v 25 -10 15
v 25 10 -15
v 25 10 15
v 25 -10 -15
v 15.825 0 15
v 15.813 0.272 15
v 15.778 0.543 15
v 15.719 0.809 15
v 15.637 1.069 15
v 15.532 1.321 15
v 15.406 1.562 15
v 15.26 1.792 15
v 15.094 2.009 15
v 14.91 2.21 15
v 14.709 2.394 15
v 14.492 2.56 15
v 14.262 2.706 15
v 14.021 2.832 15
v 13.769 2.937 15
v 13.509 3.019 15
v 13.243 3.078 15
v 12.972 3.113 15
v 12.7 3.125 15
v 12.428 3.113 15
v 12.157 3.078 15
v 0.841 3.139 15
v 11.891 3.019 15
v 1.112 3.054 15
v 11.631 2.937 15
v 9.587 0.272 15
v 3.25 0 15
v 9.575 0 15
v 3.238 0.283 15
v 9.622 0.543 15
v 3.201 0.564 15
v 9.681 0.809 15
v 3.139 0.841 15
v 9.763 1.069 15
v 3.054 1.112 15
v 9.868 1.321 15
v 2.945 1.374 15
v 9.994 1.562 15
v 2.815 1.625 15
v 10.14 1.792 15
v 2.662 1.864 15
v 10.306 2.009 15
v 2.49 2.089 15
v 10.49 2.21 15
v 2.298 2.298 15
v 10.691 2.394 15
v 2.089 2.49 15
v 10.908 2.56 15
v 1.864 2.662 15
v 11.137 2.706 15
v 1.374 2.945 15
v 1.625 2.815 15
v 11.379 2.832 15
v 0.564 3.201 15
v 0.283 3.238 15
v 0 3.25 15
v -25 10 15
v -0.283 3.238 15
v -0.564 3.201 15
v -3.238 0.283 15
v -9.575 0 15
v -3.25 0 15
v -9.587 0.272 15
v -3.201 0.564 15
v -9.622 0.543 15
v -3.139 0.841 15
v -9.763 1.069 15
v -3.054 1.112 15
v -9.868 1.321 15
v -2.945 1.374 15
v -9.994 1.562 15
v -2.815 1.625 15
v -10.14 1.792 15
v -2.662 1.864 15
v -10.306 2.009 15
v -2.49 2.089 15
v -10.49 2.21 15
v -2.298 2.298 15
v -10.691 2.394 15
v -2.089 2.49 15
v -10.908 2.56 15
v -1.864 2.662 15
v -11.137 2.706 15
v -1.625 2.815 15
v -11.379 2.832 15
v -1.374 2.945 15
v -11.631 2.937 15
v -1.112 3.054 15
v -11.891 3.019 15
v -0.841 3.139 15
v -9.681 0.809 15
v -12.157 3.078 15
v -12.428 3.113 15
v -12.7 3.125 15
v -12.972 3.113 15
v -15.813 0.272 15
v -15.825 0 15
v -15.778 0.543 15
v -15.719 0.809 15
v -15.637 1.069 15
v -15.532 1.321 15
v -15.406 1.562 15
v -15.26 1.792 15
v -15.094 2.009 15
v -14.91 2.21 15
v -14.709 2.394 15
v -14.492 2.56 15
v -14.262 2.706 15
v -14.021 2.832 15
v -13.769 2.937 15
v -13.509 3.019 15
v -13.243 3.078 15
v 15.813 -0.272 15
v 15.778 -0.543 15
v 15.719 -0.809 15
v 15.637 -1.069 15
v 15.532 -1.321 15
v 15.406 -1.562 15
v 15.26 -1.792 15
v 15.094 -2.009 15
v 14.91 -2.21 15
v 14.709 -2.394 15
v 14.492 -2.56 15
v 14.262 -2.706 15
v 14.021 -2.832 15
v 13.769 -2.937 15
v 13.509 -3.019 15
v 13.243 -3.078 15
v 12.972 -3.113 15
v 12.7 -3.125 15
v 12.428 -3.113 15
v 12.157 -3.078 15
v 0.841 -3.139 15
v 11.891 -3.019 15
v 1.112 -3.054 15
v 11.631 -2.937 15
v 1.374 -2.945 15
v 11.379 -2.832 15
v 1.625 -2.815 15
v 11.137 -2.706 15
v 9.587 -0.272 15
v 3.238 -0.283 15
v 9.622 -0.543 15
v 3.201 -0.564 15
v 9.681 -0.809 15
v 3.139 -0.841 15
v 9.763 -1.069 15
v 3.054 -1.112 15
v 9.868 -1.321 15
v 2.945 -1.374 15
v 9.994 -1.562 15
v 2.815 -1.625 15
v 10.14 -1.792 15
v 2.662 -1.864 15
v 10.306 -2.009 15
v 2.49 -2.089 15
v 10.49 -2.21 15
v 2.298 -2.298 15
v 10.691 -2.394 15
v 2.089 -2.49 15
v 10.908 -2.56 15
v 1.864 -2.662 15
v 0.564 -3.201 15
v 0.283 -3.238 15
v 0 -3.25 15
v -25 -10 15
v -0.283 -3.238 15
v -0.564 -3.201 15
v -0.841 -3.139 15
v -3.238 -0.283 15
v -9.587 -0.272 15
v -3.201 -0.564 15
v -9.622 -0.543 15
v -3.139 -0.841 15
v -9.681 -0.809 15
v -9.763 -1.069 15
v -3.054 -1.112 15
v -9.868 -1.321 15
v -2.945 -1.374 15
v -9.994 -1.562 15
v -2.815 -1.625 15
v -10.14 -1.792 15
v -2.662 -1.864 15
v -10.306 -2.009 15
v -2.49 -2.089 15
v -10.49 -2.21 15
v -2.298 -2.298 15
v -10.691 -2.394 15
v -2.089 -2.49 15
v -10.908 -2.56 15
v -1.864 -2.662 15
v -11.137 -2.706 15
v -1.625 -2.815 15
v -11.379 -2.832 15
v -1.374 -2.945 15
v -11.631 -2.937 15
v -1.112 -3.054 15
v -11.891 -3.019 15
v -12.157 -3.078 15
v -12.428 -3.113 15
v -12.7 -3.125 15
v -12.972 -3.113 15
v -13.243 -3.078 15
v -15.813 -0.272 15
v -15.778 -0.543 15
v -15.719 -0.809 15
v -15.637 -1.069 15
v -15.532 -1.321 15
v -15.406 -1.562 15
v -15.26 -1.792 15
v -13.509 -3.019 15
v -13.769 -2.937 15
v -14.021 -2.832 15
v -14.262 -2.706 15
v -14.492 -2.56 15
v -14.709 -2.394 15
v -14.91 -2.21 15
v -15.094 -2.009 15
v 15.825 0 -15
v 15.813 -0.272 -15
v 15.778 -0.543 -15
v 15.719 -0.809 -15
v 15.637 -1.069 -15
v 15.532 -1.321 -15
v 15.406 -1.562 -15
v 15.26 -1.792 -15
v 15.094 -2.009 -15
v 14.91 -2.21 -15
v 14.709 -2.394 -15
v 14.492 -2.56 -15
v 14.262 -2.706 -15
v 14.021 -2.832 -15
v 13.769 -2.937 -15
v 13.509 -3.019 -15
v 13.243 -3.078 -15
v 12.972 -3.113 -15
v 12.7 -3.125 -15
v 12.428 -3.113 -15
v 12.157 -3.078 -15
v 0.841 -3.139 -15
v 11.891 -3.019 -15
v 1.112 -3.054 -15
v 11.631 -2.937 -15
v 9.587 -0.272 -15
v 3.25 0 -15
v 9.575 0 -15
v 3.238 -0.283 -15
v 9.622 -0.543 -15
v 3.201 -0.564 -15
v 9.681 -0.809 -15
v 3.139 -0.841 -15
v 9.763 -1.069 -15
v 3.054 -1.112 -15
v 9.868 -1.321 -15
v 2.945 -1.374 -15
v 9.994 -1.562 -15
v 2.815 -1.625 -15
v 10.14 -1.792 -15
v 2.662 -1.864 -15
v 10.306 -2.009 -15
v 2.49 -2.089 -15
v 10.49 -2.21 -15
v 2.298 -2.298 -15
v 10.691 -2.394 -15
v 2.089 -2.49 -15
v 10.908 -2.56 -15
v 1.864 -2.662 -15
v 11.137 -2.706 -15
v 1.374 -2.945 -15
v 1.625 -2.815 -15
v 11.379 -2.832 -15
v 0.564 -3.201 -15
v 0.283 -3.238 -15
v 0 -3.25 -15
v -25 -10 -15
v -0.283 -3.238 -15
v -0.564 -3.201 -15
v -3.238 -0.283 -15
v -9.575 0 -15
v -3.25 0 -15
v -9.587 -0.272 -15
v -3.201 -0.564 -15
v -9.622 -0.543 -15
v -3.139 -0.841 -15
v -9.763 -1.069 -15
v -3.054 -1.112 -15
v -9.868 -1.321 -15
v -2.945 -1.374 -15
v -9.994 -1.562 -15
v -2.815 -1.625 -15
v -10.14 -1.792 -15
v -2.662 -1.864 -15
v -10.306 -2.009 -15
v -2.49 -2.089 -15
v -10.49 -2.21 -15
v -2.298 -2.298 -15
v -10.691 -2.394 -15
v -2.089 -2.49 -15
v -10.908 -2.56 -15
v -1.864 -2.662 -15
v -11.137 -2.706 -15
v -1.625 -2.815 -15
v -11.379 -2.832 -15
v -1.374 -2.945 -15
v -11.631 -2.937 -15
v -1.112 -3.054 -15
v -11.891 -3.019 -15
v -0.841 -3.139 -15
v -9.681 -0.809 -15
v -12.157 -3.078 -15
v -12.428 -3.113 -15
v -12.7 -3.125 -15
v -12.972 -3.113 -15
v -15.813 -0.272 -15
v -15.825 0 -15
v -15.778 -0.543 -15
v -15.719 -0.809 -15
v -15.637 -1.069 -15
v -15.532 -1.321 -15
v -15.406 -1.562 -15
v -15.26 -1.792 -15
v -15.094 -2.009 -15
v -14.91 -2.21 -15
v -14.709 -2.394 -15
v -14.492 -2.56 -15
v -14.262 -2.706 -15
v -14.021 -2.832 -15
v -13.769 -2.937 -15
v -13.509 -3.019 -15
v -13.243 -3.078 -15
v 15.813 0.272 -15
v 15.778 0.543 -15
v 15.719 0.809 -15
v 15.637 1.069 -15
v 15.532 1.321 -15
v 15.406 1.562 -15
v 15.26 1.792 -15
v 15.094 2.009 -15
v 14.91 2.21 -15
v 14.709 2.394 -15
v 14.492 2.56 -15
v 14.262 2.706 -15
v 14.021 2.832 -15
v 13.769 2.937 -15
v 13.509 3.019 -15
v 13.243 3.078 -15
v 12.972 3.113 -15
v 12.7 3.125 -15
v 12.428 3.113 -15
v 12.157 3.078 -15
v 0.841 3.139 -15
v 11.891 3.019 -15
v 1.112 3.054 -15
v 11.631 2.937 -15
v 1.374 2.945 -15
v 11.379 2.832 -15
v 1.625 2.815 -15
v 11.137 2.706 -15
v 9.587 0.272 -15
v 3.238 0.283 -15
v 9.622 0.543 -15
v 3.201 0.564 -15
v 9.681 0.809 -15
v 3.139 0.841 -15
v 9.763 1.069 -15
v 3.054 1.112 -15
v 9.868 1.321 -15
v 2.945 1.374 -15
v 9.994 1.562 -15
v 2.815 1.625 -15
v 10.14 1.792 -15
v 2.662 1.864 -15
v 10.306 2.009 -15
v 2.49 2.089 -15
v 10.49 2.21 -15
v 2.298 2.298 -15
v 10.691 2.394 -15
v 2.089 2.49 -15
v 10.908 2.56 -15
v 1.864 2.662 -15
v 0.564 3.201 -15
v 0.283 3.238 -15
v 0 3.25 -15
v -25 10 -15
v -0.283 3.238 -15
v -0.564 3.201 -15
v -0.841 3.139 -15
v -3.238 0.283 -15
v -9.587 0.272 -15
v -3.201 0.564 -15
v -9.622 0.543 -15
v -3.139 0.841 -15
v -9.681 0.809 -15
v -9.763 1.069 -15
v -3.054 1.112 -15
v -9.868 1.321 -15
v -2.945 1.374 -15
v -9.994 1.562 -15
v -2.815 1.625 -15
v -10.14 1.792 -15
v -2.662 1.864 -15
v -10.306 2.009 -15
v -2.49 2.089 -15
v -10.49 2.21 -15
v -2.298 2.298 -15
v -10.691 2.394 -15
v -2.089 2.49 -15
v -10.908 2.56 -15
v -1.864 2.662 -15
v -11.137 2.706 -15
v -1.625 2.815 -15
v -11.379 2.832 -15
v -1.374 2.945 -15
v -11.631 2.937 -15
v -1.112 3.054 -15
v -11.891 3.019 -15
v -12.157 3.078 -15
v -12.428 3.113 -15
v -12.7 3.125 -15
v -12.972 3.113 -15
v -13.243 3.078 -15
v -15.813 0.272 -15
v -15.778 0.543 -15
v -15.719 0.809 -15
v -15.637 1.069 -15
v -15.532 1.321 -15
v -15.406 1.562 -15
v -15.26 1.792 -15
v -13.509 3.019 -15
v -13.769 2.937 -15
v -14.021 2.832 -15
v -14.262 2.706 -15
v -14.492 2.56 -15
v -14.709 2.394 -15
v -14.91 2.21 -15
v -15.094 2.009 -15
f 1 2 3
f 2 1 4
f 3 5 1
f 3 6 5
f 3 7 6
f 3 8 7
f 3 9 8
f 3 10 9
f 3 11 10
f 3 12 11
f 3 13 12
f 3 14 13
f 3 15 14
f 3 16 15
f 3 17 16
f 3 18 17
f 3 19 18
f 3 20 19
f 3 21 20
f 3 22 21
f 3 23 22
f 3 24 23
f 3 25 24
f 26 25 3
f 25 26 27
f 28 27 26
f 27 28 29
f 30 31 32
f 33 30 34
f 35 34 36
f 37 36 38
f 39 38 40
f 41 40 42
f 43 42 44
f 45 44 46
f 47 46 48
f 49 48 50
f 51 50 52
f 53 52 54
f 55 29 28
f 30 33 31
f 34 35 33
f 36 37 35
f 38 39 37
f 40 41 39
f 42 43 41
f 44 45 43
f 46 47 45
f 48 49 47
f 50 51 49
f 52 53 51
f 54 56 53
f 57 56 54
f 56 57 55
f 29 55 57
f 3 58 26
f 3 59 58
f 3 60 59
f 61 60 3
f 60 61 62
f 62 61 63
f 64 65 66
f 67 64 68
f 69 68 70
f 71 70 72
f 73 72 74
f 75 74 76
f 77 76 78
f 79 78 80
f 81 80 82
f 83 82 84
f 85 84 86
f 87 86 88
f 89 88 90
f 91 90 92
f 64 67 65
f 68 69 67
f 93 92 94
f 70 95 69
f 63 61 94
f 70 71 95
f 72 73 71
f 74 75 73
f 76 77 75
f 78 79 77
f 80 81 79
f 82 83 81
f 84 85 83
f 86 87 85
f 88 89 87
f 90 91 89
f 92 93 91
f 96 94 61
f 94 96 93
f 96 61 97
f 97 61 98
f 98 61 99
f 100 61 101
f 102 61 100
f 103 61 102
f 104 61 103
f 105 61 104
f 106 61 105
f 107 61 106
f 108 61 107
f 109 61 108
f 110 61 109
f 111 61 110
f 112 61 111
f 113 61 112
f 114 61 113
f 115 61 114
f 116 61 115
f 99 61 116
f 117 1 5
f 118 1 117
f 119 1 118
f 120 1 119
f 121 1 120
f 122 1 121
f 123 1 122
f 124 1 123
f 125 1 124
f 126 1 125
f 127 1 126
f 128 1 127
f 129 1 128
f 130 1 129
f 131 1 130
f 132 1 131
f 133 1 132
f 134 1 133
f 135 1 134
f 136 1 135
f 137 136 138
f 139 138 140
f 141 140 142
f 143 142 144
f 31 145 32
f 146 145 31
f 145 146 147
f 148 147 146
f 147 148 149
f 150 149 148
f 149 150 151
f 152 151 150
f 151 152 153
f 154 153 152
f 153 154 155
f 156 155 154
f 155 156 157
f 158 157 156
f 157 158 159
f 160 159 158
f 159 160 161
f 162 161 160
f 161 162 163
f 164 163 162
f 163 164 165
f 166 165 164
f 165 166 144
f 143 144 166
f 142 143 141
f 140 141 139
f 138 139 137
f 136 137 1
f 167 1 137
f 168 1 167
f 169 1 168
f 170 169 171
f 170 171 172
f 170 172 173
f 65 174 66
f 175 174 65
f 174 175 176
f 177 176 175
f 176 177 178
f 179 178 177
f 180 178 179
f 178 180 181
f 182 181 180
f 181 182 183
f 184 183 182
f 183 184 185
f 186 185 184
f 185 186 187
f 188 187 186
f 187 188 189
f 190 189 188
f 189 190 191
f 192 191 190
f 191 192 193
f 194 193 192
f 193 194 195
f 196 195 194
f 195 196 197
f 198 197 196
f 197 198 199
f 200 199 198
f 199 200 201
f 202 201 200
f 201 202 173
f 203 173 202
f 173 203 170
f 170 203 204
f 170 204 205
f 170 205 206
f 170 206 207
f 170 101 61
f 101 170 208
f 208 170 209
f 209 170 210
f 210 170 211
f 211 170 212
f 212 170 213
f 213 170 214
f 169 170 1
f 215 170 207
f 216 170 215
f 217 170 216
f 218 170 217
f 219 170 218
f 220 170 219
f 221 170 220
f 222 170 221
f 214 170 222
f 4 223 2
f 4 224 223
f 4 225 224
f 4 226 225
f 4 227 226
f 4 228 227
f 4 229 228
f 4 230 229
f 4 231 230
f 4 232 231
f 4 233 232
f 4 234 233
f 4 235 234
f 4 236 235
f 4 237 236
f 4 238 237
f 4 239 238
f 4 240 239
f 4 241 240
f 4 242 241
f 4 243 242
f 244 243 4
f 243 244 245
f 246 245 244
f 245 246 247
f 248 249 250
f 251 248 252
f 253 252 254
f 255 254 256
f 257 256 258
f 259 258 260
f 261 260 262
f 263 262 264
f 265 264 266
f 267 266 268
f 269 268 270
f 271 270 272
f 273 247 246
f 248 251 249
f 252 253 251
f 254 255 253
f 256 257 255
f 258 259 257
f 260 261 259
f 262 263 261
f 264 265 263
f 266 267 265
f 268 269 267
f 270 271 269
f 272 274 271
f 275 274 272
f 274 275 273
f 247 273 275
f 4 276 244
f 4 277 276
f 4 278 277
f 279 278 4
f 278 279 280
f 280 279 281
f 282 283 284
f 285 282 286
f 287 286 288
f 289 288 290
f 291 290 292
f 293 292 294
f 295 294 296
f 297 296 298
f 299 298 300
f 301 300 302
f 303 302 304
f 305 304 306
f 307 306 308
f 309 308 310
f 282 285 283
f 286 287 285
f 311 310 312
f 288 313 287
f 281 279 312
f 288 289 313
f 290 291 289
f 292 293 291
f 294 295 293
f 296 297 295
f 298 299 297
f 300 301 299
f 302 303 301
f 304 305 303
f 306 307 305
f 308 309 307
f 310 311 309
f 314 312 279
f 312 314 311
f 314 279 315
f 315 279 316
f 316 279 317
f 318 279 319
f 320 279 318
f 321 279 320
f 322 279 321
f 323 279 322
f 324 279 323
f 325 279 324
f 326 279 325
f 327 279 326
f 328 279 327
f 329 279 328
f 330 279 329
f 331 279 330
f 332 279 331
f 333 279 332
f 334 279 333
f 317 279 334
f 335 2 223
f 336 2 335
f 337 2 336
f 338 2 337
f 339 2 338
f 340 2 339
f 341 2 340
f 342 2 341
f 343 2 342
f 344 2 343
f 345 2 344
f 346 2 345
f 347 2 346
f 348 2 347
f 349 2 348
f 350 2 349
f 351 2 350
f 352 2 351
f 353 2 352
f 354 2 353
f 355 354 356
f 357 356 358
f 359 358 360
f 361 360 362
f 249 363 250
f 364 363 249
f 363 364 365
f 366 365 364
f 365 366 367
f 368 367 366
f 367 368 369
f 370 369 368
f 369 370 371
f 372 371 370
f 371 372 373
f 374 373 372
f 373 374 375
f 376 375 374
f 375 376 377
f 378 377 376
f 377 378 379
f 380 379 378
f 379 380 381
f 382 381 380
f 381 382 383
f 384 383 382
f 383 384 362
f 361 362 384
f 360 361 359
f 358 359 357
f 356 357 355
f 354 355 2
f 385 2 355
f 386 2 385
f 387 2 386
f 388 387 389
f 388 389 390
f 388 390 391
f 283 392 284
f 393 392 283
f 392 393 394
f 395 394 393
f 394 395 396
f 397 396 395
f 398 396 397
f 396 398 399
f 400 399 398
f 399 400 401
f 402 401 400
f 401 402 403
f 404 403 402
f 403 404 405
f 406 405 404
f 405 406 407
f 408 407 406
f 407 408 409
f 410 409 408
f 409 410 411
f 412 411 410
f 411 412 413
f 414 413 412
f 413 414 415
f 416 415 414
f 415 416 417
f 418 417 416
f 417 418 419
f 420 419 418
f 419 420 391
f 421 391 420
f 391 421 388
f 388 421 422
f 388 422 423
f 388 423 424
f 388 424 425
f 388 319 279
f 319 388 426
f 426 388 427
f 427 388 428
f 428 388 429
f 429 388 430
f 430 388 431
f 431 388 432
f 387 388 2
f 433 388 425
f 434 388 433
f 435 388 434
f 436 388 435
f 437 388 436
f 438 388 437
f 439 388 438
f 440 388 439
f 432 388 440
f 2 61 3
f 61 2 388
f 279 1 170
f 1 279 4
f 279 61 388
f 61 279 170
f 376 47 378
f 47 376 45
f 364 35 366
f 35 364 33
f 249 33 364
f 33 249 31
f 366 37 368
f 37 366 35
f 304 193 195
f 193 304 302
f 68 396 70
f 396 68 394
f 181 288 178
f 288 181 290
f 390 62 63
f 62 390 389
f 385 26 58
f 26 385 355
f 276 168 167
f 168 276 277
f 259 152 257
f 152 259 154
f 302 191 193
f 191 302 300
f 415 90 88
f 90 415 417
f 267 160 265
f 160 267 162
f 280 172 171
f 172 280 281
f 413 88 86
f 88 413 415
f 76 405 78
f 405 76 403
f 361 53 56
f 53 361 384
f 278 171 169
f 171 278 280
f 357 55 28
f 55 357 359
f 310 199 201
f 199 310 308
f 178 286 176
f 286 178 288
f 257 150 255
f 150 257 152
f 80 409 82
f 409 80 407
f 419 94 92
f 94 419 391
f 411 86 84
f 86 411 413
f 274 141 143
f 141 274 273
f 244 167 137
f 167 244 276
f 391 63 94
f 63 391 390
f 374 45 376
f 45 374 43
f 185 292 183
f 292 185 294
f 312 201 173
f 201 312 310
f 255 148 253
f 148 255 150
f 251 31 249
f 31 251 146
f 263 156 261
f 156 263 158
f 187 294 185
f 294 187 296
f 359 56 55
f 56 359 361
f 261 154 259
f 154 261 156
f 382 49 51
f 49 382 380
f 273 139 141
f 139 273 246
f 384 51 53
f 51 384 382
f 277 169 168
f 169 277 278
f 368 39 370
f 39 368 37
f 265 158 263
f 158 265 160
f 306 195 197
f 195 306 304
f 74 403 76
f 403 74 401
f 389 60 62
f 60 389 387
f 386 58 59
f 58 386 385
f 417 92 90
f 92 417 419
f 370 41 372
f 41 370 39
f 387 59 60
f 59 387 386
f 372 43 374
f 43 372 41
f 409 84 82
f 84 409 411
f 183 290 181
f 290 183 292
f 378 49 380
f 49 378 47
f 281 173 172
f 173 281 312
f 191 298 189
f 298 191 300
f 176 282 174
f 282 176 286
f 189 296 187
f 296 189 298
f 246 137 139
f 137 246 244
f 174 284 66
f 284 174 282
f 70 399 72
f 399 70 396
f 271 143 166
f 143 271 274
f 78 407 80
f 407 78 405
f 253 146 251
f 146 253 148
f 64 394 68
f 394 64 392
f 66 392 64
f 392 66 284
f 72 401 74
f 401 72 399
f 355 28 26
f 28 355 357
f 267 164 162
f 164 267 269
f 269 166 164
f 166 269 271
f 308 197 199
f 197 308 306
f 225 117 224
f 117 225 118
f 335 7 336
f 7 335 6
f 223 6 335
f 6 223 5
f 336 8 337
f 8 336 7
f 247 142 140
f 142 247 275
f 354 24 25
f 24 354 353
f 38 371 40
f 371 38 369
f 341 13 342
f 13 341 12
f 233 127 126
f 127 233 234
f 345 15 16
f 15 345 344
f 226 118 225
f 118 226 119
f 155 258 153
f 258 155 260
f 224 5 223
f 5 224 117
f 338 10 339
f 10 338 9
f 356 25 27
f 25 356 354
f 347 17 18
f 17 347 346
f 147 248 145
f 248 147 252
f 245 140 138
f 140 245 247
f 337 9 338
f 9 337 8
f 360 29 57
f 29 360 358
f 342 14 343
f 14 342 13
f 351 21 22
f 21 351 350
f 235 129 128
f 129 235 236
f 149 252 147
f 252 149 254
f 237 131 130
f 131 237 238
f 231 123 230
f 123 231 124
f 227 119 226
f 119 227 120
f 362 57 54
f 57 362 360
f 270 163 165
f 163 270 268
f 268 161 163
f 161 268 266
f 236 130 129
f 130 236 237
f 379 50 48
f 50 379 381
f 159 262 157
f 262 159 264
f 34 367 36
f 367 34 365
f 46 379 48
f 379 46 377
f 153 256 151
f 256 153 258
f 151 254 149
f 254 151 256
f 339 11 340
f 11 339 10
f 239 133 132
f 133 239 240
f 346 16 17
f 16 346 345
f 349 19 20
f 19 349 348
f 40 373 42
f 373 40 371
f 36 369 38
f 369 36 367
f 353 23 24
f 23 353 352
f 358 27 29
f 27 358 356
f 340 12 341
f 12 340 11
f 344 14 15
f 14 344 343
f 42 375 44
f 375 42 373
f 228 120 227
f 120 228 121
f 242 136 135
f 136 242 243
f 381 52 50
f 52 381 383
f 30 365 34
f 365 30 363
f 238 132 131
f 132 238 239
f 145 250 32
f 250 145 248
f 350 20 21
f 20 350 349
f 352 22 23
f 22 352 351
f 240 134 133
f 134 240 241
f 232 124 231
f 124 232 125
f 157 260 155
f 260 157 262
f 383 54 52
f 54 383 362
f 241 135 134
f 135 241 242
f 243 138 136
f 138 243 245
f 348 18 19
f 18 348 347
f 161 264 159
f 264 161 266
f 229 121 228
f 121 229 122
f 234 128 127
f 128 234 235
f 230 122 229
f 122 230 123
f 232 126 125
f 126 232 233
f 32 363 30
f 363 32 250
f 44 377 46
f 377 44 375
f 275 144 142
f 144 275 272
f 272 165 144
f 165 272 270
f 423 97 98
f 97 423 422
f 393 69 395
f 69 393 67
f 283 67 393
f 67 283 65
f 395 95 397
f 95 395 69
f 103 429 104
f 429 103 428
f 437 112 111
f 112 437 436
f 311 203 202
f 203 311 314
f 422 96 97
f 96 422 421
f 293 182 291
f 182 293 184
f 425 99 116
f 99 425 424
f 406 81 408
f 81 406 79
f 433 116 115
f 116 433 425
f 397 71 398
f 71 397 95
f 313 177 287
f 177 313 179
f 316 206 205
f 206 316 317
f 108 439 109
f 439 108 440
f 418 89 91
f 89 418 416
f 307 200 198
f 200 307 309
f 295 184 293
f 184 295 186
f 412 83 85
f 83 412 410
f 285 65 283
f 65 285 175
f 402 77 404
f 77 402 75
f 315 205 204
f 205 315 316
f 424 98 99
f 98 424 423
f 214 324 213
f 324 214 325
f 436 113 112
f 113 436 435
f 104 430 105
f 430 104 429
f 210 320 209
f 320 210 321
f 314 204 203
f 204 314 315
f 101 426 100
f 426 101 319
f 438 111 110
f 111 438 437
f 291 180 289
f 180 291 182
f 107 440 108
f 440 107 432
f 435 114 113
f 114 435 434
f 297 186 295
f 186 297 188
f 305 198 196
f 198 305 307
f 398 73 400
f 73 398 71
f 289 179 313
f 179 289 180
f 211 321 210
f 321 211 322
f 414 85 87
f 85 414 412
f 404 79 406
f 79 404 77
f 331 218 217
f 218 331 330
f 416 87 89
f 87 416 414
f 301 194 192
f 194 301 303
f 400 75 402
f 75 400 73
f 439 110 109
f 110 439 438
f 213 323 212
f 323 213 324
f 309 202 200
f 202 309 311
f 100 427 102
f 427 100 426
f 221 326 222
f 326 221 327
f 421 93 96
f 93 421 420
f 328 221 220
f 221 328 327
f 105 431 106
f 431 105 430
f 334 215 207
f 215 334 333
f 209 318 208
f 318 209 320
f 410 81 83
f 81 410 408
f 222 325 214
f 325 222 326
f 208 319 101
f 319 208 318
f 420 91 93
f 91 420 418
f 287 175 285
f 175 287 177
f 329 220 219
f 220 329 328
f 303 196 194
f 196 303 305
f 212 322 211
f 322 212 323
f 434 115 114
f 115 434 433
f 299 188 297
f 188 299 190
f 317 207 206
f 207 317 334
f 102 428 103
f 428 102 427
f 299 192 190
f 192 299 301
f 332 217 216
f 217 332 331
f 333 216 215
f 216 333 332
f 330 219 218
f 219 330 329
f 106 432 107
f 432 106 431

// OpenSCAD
// file: lib/knex_lib.scad
// K'Nex Parts Library — shared modules for all part SCADs
// Geometry derived from https://www.printables.com/model/143840-knex-parts-customizable
// Measurements in millimeters (digital calipers)

knexDiameter = 6.25;

// --- Rod modules ---

module RodEnd(height) {
    difference() {
        cylinder(h=height, d=knexDiameter, $fn=50);
        // Snap groove near the tip
        translate([0, 0, height - 3.1])
        scale([1, 1, 1.93])
        rotate_extrude(convexity=10, $fn=30)
        translate([3.125, 0, 0])
        scale([1, 1, 0])
        circle(r=0.905, $fn=20);
    }
}

module RodCenter(length) {
    // Cross-shaped center section (+ profile)
    intersection() {
        cylinder(h=length, d=knexDiameter, $fn=50);
        union() {
            translate([-.95, -knexDiameter/2, 0])
            cube([1.9, knexDiameter + 1, length]);
            translate([-knexDiameter/2, -.95, 0])
            cube([knexDiameter + 1, 1.9, length]);
        }
    }
}

module fullRod(endHeight, centerLength) {
    // Builds along Z: from -endHeight to centerLength+endHeight
    translate([0, 0, centerLength])
    RodEnd(endHeight);
    RodCenter(centerLength);
    mirror([0, 0, 1])
    RodEnd(endHeight);
}

module fullRod2(externalLength, internalLength) {
    // Convenience: specify overall and center-section lengths
    fullRod((externalLength - internalLength) / 2, internalLength);
}

// --- Connector modules ---

module ConnectorCenter(height, width) {
    difference() {
        cylinder(h=height, d=6.55 + width * 2, $fn=50);
        translate([0, 0, -0.5])
        cylinder(h=height + 1, d=6.55, $fn=50);
    }
}

module ConnectorEndpt(i, c, a, j) {
    union() {
        translate([0, 0, 9.4 - 1])
        cube([6.16, 9.35/2, 1]);
        cube([6.16, 1.2, 9.4]);
        translate([6.16/2, 1.23, 6.16 - 3.8/5])
        scale([1, 2.3, 3.4])
        rotate([0, 90, 0])
        cylinder(d=1, h=6.16, $fn=25, center=true);
        linear_extrude(height=6)
        difference() {
            polygon(points=[
                [0, 0], [6.16, 0], [6.16, 1.8],
                [6.16 - 1.46, 2.15], [1.46, 2.15], [0, 1.8]
            ]);
            translate([6.16/2, 9.35/2, 0])
            circle(d=6.25, $fn=90);
        }
    }
    if (i > 0) {
        if ((((i == c && j == 1) || (i == 1 && j == 2)) && c < 8) || a - 360 > 80) {
            // Straight locking tab (for end arms or wide-angle connectors)
            translate([0, 0, 9])
            cube([6.16, 1.4, 10]);
        }
        else {
            // Angled locking tab (for tight-angle connectors)
            translate([0, 0, 9.25])
            rotate([-45/2])
            cube([6.16, 1.4, 7]);
        }
    }
}

module ConnectorEnd(i=0, c=0, a=45) {
    translate([0, -9.35/2, 6.16])
    rotate([0, 90, 0])
    union() {
        ConnectorEndpt(i, c, a, 1);
        translate([0, 9.35, 0])
        mirror([0, 1, 0])
        ConnectorEndpt(i, c, a, 2);
    }
}

// Arm offset from center to ConnectorEnd origin
_arm_offset = -(23.15 - (6.5 + 1.4) / 2) + 0.5;

module Connector(c, a=45) {
    // c = number of arms, a = angle parameter (use 360+spacing for proper tab logic)
    // Effective arm spacing = a mod 360
    union() {
        ConnectorCenter(6.16, 1.4);
        for (i = [1:c]) {
            rotate([0, 0, (i-1) * a])
            translate([_arm_offset, 0, 0])
            ConnectorEnd(i, c, a);
        }
    }
}
// main file
// K'NEX Electric Motor Block
include <lib/knex_lib.scad>
$fn = 72;

module MotorBlock() {
    difference() {
        union() {
            // Main rectangular body
            color("#333333")
            translate([-20, -10, -15])
            cube([40, 20, 30]);
            
            // Mounting wings
            color("#222222") {
                translate([10, -10, -15]) cube([15, 20, 30]);
                translate([-25, -10, -15]) cube([15, 20, 30]);
            }
        }
        
        // Drive axle hole (rotational center)
        translate([0, 0, -20])
        cylinder(d=6.5, h=50);
        
        // Mounting holes (standard 12.7mm grid)
        translate([12.7, 0, -20])
        cylinder(d=6.25, h=50);
        
        translate([-12.7, 0, -20])
        cylinder(d=6.25, h=50);
    }
}

MotorBlock();
